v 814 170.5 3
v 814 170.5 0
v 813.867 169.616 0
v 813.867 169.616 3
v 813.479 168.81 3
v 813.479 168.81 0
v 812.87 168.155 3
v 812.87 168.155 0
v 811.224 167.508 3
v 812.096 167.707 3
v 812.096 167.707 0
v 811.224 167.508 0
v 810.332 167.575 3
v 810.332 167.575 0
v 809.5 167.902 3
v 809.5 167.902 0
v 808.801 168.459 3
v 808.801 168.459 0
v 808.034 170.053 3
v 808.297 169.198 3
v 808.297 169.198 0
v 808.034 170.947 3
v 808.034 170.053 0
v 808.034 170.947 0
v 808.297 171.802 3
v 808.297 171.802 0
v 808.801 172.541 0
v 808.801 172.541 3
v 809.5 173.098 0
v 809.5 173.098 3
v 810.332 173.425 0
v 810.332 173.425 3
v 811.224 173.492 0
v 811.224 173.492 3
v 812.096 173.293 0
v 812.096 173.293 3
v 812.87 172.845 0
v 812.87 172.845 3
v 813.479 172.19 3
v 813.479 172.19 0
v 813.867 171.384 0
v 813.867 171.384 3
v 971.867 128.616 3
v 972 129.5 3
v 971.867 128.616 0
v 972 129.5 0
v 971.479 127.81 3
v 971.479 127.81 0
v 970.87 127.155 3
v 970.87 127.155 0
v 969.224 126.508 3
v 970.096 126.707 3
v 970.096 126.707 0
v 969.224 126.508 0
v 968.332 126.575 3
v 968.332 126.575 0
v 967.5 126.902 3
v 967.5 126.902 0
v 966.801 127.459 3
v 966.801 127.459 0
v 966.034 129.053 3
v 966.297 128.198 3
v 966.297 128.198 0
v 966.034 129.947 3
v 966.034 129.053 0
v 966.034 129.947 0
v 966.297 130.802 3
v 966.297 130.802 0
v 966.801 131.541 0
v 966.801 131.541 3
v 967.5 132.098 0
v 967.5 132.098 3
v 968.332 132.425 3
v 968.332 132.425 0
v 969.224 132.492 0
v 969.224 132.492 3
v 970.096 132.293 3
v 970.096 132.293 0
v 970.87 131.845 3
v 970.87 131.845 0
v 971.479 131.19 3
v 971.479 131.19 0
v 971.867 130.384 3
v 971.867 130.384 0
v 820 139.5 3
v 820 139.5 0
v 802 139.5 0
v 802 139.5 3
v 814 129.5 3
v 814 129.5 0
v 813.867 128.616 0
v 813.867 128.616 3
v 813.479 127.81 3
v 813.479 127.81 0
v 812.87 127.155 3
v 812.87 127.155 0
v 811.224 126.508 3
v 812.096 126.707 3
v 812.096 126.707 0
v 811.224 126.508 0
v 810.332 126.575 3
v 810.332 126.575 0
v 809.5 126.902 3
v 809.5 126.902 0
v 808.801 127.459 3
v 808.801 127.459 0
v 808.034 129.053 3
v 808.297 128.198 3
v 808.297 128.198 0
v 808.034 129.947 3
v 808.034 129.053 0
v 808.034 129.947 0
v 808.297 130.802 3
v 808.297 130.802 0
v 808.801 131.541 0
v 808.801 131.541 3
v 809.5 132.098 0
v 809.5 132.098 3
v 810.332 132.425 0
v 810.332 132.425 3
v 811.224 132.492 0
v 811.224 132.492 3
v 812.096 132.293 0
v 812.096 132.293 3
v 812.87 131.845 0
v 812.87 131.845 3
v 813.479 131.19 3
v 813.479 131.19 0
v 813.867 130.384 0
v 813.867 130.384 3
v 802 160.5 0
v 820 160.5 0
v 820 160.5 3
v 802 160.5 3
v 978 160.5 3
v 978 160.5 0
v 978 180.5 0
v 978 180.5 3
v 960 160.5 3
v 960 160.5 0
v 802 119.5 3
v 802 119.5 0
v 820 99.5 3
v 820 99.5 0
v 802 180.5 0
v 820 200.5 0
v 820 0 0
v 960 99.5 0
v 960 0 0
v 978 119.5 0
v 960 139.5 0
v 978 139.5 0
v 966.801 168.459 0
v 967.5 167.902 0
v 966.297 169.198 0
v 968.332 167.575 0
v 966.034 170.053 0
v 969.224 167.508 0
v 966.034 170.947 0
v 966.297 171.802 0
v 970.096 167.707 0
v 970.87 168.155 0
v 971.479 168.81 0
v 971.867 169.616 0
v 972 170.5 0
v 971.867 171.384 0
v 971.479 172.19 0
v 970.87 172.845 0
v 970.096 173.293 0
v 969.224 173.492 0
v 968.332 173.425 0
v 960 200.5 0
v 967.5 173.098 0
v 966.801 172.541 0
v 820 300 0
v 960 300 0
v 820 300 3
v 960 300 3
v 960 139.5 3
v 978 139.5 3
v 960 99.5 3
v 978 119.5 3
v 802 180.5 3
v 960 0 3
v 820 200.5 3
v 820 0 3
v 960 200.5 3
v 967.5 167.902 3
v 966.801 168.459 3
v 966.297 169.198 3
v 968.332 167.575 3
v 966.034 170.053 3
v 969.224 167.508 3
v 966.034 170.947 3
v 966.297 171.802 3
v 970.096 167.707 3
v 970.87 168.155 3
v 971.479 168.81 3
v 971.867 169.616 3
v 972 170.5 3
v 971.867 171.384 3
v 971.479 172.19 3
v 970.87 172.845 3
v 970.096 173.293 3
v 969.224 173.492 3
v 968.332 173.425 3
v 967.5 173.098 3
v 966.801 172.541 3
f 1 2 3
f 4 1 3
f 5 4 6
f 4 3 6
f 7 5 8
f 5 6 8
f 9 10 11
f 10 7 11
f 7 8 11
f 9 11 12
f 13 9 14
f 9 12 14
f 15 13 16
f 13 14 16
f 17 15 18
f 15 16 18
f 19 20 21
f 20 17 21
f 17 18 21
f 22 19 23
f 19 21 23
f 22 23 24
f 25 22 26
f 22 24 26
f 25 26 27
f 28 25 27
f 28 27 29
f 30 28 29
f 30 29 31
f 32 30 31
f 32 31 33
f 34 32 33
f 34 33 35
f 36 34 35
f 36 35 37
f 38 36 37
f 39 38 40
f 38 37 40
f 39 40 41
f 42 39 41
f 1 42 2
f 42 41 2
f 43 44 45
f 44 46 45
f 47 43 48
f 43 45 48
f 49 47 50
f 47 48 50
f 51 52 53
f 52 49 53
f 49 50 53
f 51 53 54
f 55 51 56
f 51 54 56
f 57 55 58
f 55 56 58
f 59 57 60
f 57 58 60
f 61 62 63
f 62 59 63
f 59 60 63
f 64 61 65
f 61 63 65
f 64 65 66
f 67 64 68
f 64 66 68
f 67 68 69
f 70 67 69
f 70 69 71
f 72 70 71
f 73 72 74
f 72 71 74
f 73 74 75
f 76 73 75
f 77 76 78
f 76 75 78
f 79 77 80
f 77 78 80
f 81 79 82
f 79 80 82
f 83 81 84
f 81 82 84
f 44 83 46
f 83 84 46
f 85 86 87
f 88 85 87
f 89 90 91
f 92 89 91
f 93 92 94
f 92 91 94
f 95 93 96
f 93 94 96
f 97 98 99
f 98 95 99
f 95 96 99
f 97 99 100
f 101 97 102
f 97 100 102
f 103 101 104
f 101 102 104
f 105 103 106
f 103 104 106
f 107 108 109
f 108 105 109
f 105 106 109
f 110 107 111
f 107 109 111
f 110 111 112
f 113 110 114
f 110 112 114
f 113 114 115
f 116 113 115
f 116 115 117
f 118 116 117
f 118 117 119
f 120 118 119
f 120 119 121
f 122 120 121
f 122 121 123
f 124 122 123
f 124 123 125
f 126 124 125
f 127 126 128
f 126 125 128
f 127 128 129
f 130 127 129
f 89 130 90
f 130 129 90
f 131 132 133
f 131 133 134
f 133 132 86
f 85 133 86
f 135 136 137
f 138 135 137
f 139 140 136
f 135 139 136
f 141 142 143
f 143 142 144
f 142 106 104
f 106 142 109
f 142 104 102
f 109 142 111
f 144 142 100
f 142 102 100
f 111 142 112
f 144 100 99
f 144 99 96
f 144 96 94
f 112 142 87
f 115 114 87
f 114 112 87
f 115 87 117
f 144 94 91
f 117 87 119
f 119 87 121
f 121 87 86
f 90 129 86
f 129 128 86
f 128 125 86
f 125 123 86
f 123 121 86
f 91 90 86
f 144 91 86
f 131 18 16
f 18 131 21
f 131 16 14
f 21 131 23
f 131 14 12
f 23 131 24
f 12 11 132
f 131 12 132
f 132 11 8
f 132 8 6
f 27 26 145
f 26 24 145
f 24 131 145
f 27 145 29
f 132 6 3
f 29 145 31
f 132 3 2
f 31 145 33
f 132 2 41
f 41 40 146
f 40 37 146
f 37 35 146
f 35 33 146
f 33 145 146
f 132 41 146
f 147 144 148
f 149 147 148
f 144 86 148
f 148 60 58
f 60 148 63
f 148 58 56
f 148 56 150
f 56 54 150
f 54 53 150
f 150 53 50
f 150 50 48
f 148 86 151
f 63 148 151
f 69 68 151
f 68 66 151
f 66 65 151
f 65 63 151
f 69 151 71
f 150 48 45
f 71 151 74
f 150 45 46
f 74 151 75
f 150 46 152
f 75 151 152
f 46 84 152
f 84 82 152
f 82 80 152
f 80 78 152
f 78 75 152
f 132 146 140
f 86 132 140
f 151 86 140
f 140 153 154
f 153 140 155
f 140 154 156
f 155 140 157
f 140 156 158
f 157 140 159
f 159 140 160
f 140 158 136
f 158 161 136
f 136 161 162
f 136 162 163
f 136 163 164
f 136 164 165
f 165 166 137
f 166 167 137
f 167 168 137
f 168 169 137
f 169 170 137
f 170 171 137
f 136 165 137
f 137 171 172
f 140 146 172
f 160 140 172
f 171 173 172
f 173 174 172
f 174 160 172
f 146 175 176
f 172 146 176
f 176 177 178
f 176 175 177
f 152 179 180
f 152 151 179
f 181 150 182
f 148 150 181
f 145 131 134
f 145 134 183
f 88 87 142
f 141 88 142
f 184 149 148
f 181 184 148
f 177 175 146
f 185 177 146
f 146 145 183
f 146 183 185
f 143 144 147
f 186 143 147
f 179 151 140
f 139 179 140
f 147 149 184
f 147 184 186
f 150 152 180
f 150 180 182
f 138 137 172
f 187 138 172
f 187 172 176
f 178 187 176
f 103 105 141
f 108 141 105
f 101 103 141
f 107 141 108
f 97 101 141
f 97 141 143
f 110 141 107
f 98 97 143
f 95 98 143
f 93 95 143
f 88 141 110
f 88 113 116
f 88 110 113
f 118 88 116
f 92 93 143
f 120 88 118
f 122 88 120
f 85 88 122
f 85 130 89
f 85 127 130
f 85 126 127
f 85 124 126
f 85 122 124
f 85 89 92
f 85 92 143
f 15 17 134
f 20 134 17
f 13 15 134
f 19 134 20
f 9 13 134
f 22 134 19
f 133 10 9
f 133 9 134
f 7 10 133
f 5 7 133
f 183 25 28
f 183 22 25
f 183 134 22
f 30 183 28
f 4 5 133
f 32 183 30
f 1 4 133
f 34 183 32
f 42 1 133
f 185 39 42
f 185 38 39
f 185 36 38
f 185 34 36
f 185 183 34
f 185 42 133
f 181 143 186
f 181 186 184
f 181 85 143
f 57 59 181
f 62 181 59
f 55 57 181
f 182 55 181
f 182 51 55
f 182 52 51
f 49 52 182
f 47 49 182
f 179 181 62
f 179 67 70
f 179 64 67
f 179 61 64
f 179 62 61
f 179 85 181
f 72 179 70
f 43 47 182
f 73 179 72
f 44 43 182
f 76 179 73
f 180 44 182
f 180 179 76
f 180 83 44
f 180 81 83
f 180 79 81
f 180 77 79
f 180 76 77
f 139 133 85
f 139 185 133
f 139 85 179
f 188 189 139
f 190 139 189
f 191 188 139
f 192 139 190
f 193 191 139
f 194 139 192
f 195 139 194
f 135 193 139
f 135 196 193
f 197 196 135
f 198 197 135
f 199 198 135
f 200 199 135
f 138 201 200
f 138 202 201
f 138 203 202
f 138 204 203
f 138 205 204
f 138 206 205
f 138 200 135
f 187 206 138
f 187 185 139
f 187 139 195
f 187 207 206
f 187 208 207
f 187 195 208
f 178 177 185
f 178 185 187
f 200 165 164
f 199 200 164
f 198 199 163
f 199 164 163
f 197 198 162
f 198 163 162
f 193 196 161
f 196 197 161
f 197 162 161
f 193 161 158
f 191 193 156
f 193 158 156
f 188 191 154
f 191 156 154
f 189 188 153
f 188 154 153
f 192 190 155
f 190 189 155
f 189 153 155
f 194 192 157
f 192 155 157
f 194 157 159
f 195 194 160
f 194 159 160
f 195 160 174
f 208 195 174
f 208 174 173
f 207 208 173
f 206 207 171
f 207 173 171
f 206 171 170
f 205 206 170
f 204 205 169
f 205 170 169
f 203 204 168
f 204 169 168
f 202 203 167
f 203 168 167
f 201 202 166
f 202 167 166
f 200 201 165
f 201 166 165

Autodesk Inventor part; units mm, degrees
ref_plane "YZ Plane" through (0, 0, 0) normal (1, 0, 0) x (0, 1, 0)
ref_plane "XZ Plane" through (0, 0, 0) normal (0, 1, 0) x (-1, 0, 0)
ref_plane "XY Plane" through (0, 0, 0) normal (0, 0, 1) x (1, 0, 0)
sketch "Sketch1" plane through (0, 0, 0) normal (0, 0, 1) x (1, 0, 0)
  line L0 (0, 0) -> (140, 0)
  line L1 (140, 0) -> (140, 300)
  line L2 (140, 300) -> (0, 300)
  line L3 (0, 300) -> (0, 0)
  line L4 (10, 290) -> (130, 290)
  line L5 (130, 290) -> (130, 10) construction
  line L6 (130, 10) -> (10, 10) construction
  line L7 (10, 10) -> (10, 290) construction
  line L8 (55.013, 210.0189) -> (44.1329, 210.0189) construction
  line L9 (10, 290) -> (130, 290) construction
  line L10 (70, 311.1686) -> (70, 319.6965) construction
  line L11 (64.8975, 210.0189) -> (64.8975, 204.1374) construction
  line L12 (75.1025, 210.0189) -> (75.1025, 204.1374) construction
  spline S0 degree 4 poles (64.8975, 210.0189) (64.8975, 218.5538) (47.6053, 225.9043) (40.8111, 229.8746) (18.3339, 245.7556) (11.7937, 258.2232) (10, 279.3922) (10, 290) knots 0 0 0 0 0 0.284812 0.471394 0.66948 1 1 1 1 1
  line L13 (10, 290) -> (10, 266.9306) construction
  spline S1 degree 4 poles (75.1025, 210.0189) (75.1025, 218.5538) (92.3947, 225.9043) (99.1889, 229.8746) (121.6661, 245.7556) (128.2063, 258.2232) (130, 279.3922) (130, 290) knots 0 0 0 0 0 0.284812 0.471394 0.66948 1 1 1 1 1
  spline S2 degree 4 poles (64.8975, 210.0189) (64.8975, 201.4839) (47.6053, 194.1334) (40.8111, 190.1632) (18.3339, 174.2821) (11.7937, 161.8145) (10, 140.6455) (10, 130.0377) knots 0 0 0 0 0 0.284812 0.471394 0.66948 1 1 1 1 1
  spline S3 degree 4 poles (75.1025, 210.0189) (75.1025, 201.4839) (92.3947, 194.1334) (99.1889, 190.1632) (121.6661, 174.2821) (128.2063, 161.8145) (130, 140.6455) (130, 130.0377) knots 0 0 0 0 0 0.284812 0.471394 0.66948 1 1 1 1 1
  line L14 (10, 130.0377) -> (10, 10)
  line L15 (130, 130.0377) -> (130, 10)
  line L16 (10, 10) -> (130, 10)
  line L17 (240, 186.8124) -> (240, 163.5372) construction
  line L18 (480, 0) -> (340, 0) construction
  line L19 (340, 0) -> (340, 300) construction
  line L20 (340, 300) -> (480, 300) construction
  line L21 (480, 300) -> (480, 0) construction
  line L22 (470, 290) -> (350, 290) construction
  line L23 (350, 290) -> (350, 10) construction
  line L24 (350, 10) -> (470, 10) construction
  line L25 (470, 10) -> (470, 290) construction
  line L26 (424.987, 210.0189) -> (435.8671, 210.0189) construction
  line L27 (470, 290) -> (350, 290) construction
  line L28 (410, 311.1686) -> (410, 319.6965) construction
  line L29 (415.1025, 210.0189) -> (415.1025, 204.1374) construction
  line L30 (404.8975, 210.0189) -> (404.8975, 204.1374) construction
  spline S4 degree 4 poles (415.1025, 210.0189) (415.1025, 218.5538) (432.3947, 225.9043) (439.1889, 229.8746) (461.6661, 245.7556) (468.2063, 258.2232) (470, 279.3922) (470, 290) knots 0 0 0 0 0 0.284812 0.471394 0.66948 1 1 1 1 1 construction
  line L31 (470, 290) -> (470, 266.9306) construction
  spline S5 degree 4 poles (404.8975, 210.0189) (394.814, 224.8509) (381.6315, 227.4313) (352.9317, 245.1456) (350.4567, 267.2032) (350, 290) knots 0 0 0 0 0 0.471394 1 1 1 1 1 construction
  spline S6 degree 4 poles (415.1025, 210.0189) (425.186, 195.1868) (438.3685, 192.6065) (467.0683, 174.8921) (469.5433, 152.8345) (470, 130.0377) knots 0 0 0 0 0 0.471394 1 1 1 1 1 construction
  spline S7 degree 4 poles (404.8975, 210.0189) (394.814, 195.1868) (381.6315, 192.6065) (352.9317, 174.8921) (350.4567, 152.8345) (350, 130.0377) knots 0 0 0 0 0 0.471394 1 1 1 1 1 construction
  line L32 (355, 14.5) -> (355, 130.0377)
  line L33 (355, 130.0377) -> (357, 130.0377)
  line L34 (357, 130.0377) -> (357, 14.5)
  arc A0 (353.5, 13) -> (355, 14.5) centre (353.5, 14.5) ccw
  arc A1 (351, 14.5) -> (352.5, 13) centre (352.5, 14.5) ccw construction
  line L35 (352.5, 13) -> (353.5, 13)
  arc A2 (357, 14.5) -> (358.5, 13) centre (358.5, 14.5) ccw
  line L36 (358.5, 13) -> (359.5, 13)
  line L37 (361, 14.5) -> (361, 130.0377)
  line L38 (363, 130.0377) -> (363, 14.5)
  arc A3 (359.5, 13) -> (361, 14.5) centre (359.5, 14.5) ccw
  line L39 (361, 130.0377) -> (363, 130.0377)
  arc A4 (363, 14.5) -> (364.5, 13) centre (364.5, 14.5) ccw
  line L40 (364.5, 13) -> (365.5, 13)
  line L41 (367, 14.5) -> (367, 130.0377)
  line L42 (369, 130.0377) -> (369, 14.5)
  arc A5 (365.5, 13) -> (367, 14.5) centre (365.5, 14.5) ccw
  line L43 (367, 130.0377) -> (369, 130.0377)
  arc A6 (369, 14.5) -> (370.5, 13) centre (370.5, 14.5) ccw
  line L44 (370.5, 13) -> (371.5, 13)
  line L45 (373, 14.5) -> (373, 130.0377)
  line L46 (375, 130.0377) -> (375, 14.5)
  arc A7 (371.5, 13) -> (373, 14.5) centre (371.5, 14.5) ccw
  line L47 (373, 130.0377) -> (375, 130.0377)
  arc A8 (375, 14.5) -> (376.5, 13) centre (376.5, 14.5) ccw
  line L48 (376.5, 13) -> (377.5, 13)
  line L49 (379, 14.5) -> (379, 130.0377)
  line L50 (381, 130.0377) -> (381, 14.5)
  arc A9 (377.5, 13) -> (379, 14.5) centre (377.5, 14.5) ccw
  line L51 (379, 130.0377) -> (381, 130.0377)
  arc A10 (381, 14.5) -> (382.5, 13) centre (382.5, 14.5) ccw
  line L52 (382.5, 13) -> (383.5, 13)
  line L53 (385, 14.5) -> (385, 130.0377)
  line L54 (387, 130.0377) -> (387, 14.5)
  arc A11 (383.5, 13) -> (385, 14.5) centre (383.5, 14.5) ccw
  line L55 (385, 130.0377) -> (387, 130.0377)
  arc A12 (387, 14.5) -> (388.5, 13) centre (388.5, 14.5) ccw
  line L56 (388.5, 13) -> (389.5, 13)
  line L57 (391, 14.5) -> (391, 130.0377)
  line L58 (393, 130.0377) -> (393, 14.5)
  arc A13 (389.5, 13) -> (391, 14.5) centre (389.5, 14.5) ccw
  line L59 (391, 130.0377) -> (393, 130.0377)
  arc A14 (393, 14.5) -> (394.5, 13) centre (394.5, 14.5) ccw
  line L60 (394.5, 13) -> (395.5, 13)
  line L61 (397, 14.5) -> (397, 130.0377)
  line L62 (399, 130.0377) -> (399, 14.5)
  arc A15 (395.5, 13) -> (397, 14.5) centre (395.5, 14.5) ccw
  line L63 (397, 130.0377) -> (399, 130.0377)
  arc A16 (399, 14.5) -> (400.5, 13) centre (400.5, 14.5) ccw
  line L64 (400.5, 13) -> (401.5, 13)
  line L65 (403, 14.5) -> (403, 130.0377)
  line L66 (405, 130.0377) -> (405, 14.5)
  arc A17 (401.5, 13) -> (403, 14.5) centre (401.5, 14.5) ccw
  line L67 (403, 130.0377) -> (405, 130.0377)
  arc A18 (405, 14.5) -> (406.5, 13) centre (406.5, 14.5) ccw
  line L68 (406.5, 13) -> (407.5, 13)
  line L69 (409, 14.5) -> (409, 130.0377)
  line L70 (411, 130.0377) -> (411, 14.5)
  arc A19 (407.5, 13) -> (409, 14.5) centre (407.5, 14.5) ccw
  line L71 (409, 130.0377) -> (411, 130.0377)
  arc A20 (411, 14.5) -> (412.5, 13) centre (412.5, 14.5) ccw
  line L72 (412.5, 13) -> (413.5, 13)
  line L73 (415, 14.5) -> (415, 130.0377)
  line L74 (417, 130.0377) -> (417, 14.5)
  arc A21 (413.5, 13) -> (415, 14.5) centre (413.5, 14.5) ccw
  line L75 (415, 130.0377) -> (417, 130.0377)
  arc A22 (417, 14.5) -> (418.5, 13) centre (418.5, 14.5) ccw
  line L76 (418.5, 13) -> (419.5, 13)
  line L77 (421, 14.5) -> (421, 130.0377)
  line L78 (423, 130.0377) -> (423, 14.5)
  arc A23 (419.5, 13) -> (421, 14.5) centre (419.5, 14.5) ccw
  line L79 (421, 130.0377) -> (423, 130.0377)
  arc A24 (423, 14.5) -> (424.5, 13) centre (424.5, 14.5) ccw
  line L80 (424.5, 13) -> (425.5, 13)
  line L81 (427, 14.5) -> (427, 130.0377)
  line L82 (429, 130.0377) -> (429, 14.5)
  arc A25 (425.5, 13) -> (427, 14.5) centre (425.5, 14.5) ccw
  line L83 (427, 130.0377) -> (429, 130.0377)
  arc A26 (429, 14.5) -> (430.5, 13) centre (430.5, 14.5) ccw
  line L84 (430.5, 13) -> (431.5, 13)
  line L85 (433, 14.5) -> (433, 130.0377)
  line L86 (435, 130.0377) -> (435, 14.5)
  arc A27 (431.5, 13) -> (433, 14.5) centre (431.5, 14.5) ccw
  line L87 (433, 130.0377) -> (435, 130.0377)
  arc A28 (435, 14.5) -> (436.5, 13) centre (436.5, 14.5) ccw
  line L88 (436.5, 13) -> (437.5, 13)
  line L89 (439, 14.5) -> (439, 130.0377)
  line L90 (441, 130.0377) -> (441, 14.5)
  arc A29 (437.5, 13) -> (439, 14.5) centre (437.5, 14.5) ccw
  line L91 (439, 130.0377) -> (441, 130.0377)
  arc A30 (441, 14.5) -> (442.5, 13) centre (442.5, 14.5) ccw
  line L92 (442.5, 13) -> (443.5, 13)
  line L93 (445, 14.5) -> (445, 130.0377)
  line L94 (447, 130.0377) -> (447, 14.5)
  arc A31 (443.5, 13) -> (445, 14.5) centre (443.5, 14.5) ccw
  line L95 (445, 130.0377) -> (447, 130.0377)
  arc A32 (447, 14.5) -> (448.5, 13) centre (448.5, 14.5) ccw
  line L96 (448.5, 13) -> (449.5, 13)
  line L97 (451, 14.5) -> (451, 130.0377)
  line L98 (453, 130.0377) -> (453, 14.5)
  arc A33 (449.5, 13) -> (451, 14.5) centre (449.5, 14.5) ccw
  line L99 (451, 130.0377) -> (453, 130.0377)
  arc A34 (453, 14.5) -> (454.5, 13) centre (454.5, 14.5) ccw
  line L100 (454.5, 13) -> (455.5, 13)
  line L101 (457, 14.5) -> (457, 130.0377)
  line L102 (459, 130.0377) -> (459, 14.5)
  arc A35 (455.5, 13) -> (457, 14.5) centre (455.5, 14.5) ccw
  line L103 (457, 130.0377) -> (459, 130.0377)
  arc A36 (459, 14.5) -> (460.5, 13) centre (460.5, 14.5) ccw
  line L104 (460.5, 13) -> (461.5, 13)
  line L105 (463, 14.5) -> (463, 130.0377)
  line L106 (465, 130.0377) -> (465, 14.5)
  arc A37 (461.5, 13) -> (463, 14.5) centre (461.5, 14.5) ccw
  line L107 (463, 130.0377) -> (465, 130.0377)
  arc A38 (465, 14.5) -> (466.5, 13) centre (466.5, 14.5) ccw
  line L108 (466.5, 13) -> (470, 13)
  line L109 (470, 10) -> (470, 13)
  line L110 (470, 10) -> (350, 10)
  line L111 (350, 10) -> (350, 13)
  line L112 (352.5, 13) -> (350, 13)
  line L113 (740, 300) -> (600, 300)
  line L114 (610, 290) -> (730, 290) construction
  line L115 (610, 290) -> (730, 290) construction
  spline S8 degree 4 poles (675.1025, 210.0189) (675.1025, 218.5538) (692.3947, 225.9043) (699.1889, 229.8746) (721.6661, 245.7556) (728.2063, 258.2232) (730, 279.3922) (730, 290) knots 0 0 0 0 0 0.284812 0.471394 0.66948 1 1 1 1 1 construction
  line L116 (664.8975, 210.0189) -> (664.8975, 204.1374) construction
  line L117 (610, 290) -> (610, 266.9306) construction
  spline S9 degree 4 poles (664.8975, 210.0189) (664.8975, 218.5538) (647.6053, 225.9043) (640.8111, 229.8746) (618.3339, 245.7556) (611.7937, 258.2232) (610, 279.3922) (610, 290) knots 0 0 0 0 0 0.284812 0.471394 0.66948 1 1 1 1 1 construction
  line L118 (675.1025, 210.0189) -> (675.1025, 204.1374) construction
  spline S10 degree 4 poles (675.1025, 210.0189) (675.1025, 201.4839) (692.3947, 194.1334) (699.1889, 190.1632) (721.6661, 174.2821) (728.2063, 161.8145) (730, 140.6455) (730, 130.0377) knots 0 0 0 0 0 0.284812 0.471394 0.66948 1 1 1 1 1 construction
  spline S11 degree 4 poles (664.8975, 210.0189) (664.8975, 201.4839) (647.6053, 194.1334) (640.8111, 190.1632) (618.3339, 174.2821) (611.7937, 161.8145) (610, 140.6455) (610, 130.0377) knots 0 0 0 0 0 0.284812 0.471394 0.66948 1 1 1 1 1 construction
  line L119 (730, 290) -> (730, 10) construction
  line L120 (610, 10) -> (610, 290) construction
  line L121 (740, 0) -> (740, 300)
  line L122 (600, 300) -> (600, 0)
  line L123 (610, 130.0377) -> (610, 10) construction
  line L124 (730, 10) -> (610, 10) construction
  line L125 (610, 10) -> (730, 10) construction
  line L126 (730, 130.0377) -> (730, 10) construction
  line L127 (600, 0) -> (740, 0)
  circle A39 centre (670, 187.6403) radius 1.45
  line L128 (661.5147, 179.155) -> (670, 187.6403) construction
  line L129 (670, 187.6403) -> (661.5147, 179.155) construction
  line L130 (661.5147, 179.155) -> (678.4853, 179.155) construction
  line L131 (130, 290) -> (130, 293.3347) construction
  line L132 (730, 290) -> (730, 294.5645) construction
  line L133 (670, 187.6403) -> (667.2579, 190.3824) construction
  line L134 (661.5147, 179.155) -> (658.7726, 181.8971) construction
  circle A40 centre (661.5147, 179.155) radius 1.45
  circle A41 centre (653.0294, 170.6697) radius 1.45
  circle A42 centre (644.5442, 162.1844) radius 1.45
  circle A43 centre (636.0589, 153.6991) radius 1.45
  circle A44 centre (627.5736, 145.2139) radius 1.45
  circle A45 centre (619.0883, 136.7286) radius 1.45
  circle A46 centre (619.0883, 153.6991) radius 1.45
  circle A47 centre (627.5736, 162.1844) radius 1.45
  circle A48 centre (636.0589, 170.6697) radius 1.45
  circle A49 centre (644.5442, 179.155) radius 1.45
  circle A50 centre (653.0294, 187.6403) radius 1.45
  circle A51 centre (686.9706, 187.6403) radius 1.45
  circle A52 centre (678.4853, 179.155) radius 1.45
  circle A53 centre (670, 170.6697) radius 1.45
  circle A54 centre (661.5147, 162.1844) radius 1.45
  circle A55 centre (653.0294, 153.6991) radius 1.45
  circle A56 centre (644.5442, 145.2139) radius 1.45
  circle A57 centre (636.0589, 136.7286) radius 1.45
  circle A58 centre (695.4558, 179.155) radius 1.45
  circle A59 centre (686.9706, 170.6697) radius 1.45
  circle A60 centre (670, 170.6697) radius 1.45
  circle A61 centre (661.5147, 162.1844) radius 1.45
  circle A62 centre (678.4853, 162.1844) radius 1.45
  circle A63 centre (653.0294, 153.6991) radius 1.45
  circle A64 centre (670, 153.6991) radius 1.45
  circle A65 centre (661.5147, 145.2139) radius 1.45
  circle A66 centre (644.5442, 145.2139) radius 1.45
  circle A67 centre (636.0589, 136.7286) radius 1.45
  circle A68 centre (653.0294, 136.7286) radius 1.45
  circle A69 centre (695.4558, 162.1844) radius 1.45
  circle A70 centre (686.9706, 153.6991) radius 1.45
  circle A71 centre (678.4853, 145.2139) radius 1.45
  circle A72 centre (670, 136.7286) radius 1.45
  circle A73 centre (712.4264, 162.1844) radius 1.45
  circle A74 centre (703.9411, 153.6991) radius 1.45
  circle A75 centre (695.4558, 145.2139) radius 1.45
  circle A76 centre (686.9706, 136.7286) radius 1.45
  circle A77 centre (703.9411, 170.6697) radius 1.45
  circle A78 centre (720.9117, 153.6991) radius 1.45
  circle A79 centre (712.4264, 145.2139) radius 1.45
  circle A80 centre (703.9411, 136.7286) radius 1.45
  circle A81 centre (720.9117, 136.7286) radius 1.45
  line L135 (0, 160.5) -> (-18, 160.5)
  line L136 (-18, 160.5) -> (-18, 180.5)
  line L137 (-18, 180.5) -> (0, 180.5) construction
  line L138 (0, 180.5) -> (0, 160.5)
  line L139 (-24.3067, 150) -> (-34.4998, 150) construction
  circle A82 centre (-9, 170.5) radius 3
  line L140 (-18, 180.5) -> (0, 200.5)
  line L141 (0, 139.5) -> (-18, 139.5)
  line L142 (-18, 139.5) -> (-18, 119.5)
  circle A83 centre (-9, 129.5) radius 3
  line L143 (-18, 119.5) -> (0, 99.5)
  line L144 (140, 160.5) -> (158, 160.5)
  line L145 (158, 160.5) -> (158, 180.5)
  circle A84 centre (149, 170.5) radius 3
  line L146 (158, 180.5) -> (140, 200.5)
  line L147 (158, 139.5) -> (158, 119.5)
  line L148 (140, 139.5) -> (158, 139.5)
  circle A85 centre (149, 129.5) radius 3
  line L149 (158, 119.5) -> (140, 99.5)
  line L150 (582, 180.5) -> (600, 200.5)
  line L151 (582, 160.5) -> (582, 180.5)
  circle A86 centre (591, 170.5) radius 3
  line L152 (600, 139.5) -> (582, 139.5)
  circle A87 centre (591, 129.5) radius 3
  line L153 (582, 139.5) -> (582, 119.5)
  line L154 (582, 119.5) -> (600, 99.5)
  line L155 (758, 180.5) -> (740, 200.5)
  line L156 (758, 160.5) -> (758, 180.5)
  circle A88 centre (749, 170.5) radius 3
  line L157 (740, 160.5) -> (758, 160.5)
  line L158 (740, 139.5) -> (758, 139.5)
  circle A89 centre (749, 129.5) radius 3
  line L159 (758, 139.5) -> (758, 119.5)
  line L160 (758, 119.5) -> (740, 99.5)
  line L161 (600, 160.5) -> (582, 160.5)
  line L162 (600, 200.5) -> (600, 300)
  line L163 (600, 300) -> (740, 300)
  line L164 (740, 300) -> (740, 200.5)
  line L165 (740, 160.5) -> (740, 139.5)
  line L166 (740, 99.5) -> (740, 0)
  line L167 (740, 0) -> (600, 0)
  line L168 (600, 0) -> (600, 99.5)
  line L169 (600, 139.5) -> (600, 160.5)
  line L170 (780, 153.6991) -> (780, 161.6118) construction
  line L171 (820, 300) -> (960, 300)
  line L172 (960, 0) -> (820, 0)
  line L173 (978, 180.5) -> (960, 200.5)
  line L174 (978, 160.5) -> (978, 180.5)
  circle A90 centre (969, 170.5) radius 3
  line L175 (960, 139.5) -> (978, 139.5)
  circle A91 centre (969, 129.5) radius 3
  line L176 (978, 139.5) -> (978, 119.5)
  line L177 (978, 119.5) -> (960, 99.5)
  line L178 (802, 180.5) -> (820, 200.5)
  line L179 (802, 160.5) -> (802, 180.5)
  circle A92 centre (811, 170.5) radius 3
  line L180 (820, 160.5) -> (802, 160.5)
  line L181 (820, 139.5) -> (802, 139.5)
  circle A93 centre (811, 129.5) radius 3
  line L182 (802, 139.5) -> (802, 119.5)
  line L183 (802, 119.5) -> (820, 99.5)
  line L184 (960, 160.5) -> (978, 160.5)
  line L185 (960, 200.5) -> (960, 300)
  line L186 (960, 300) -> (820, 300)
  line L187 (820, 300) -> (820, 200.5)
  line L188 (820, 160.5) -> (820, 139.5)
  line L189 (820, 99.5) -> (820, 0)
  line L190 (820, 0) -> (960, 0)
  line L191 (960, 0) -> (960, 99.5)
  line L192 (960, 139.5) -> (960, 160.5)
  line L193 (582, -180.5) -> (582, -200.5) construction
  circle A94 centre (591, -190.5) radius 3 construction
  line L194 (600, -159.5) -> (582, -159.5) construction
  line L195 (600, -180.5) -> (582, -180.5) construction
  line L196 (582, -200.5) -> (600, -220.5) construction
  line L197 (582, -139.5) -> (600, -119.5) construction
  line L198 (582, -159.5) -> (582, -139.5) construction
  circle A95 centre (591, -149.5) radius 3 construction
  circle A96 centre (619.0883, -166.3009) radius 1.45 construction
  circle A97 centre (627.5736, -174.7861) radius 1.45 construction
  circle A98 centre (644.5442, -157.8156) radius 1.45 construction
  circle A99 centre (627.5736, -157.8156) radius 1.45 construction
  circle A100 centre (644.5442, -174.7861) radius 1.45 construction
  circle A101 centre (636.0589, -183.2714) radius 1.45 construction
  line L199 (600, -180.5) -> (600, -159.5) construction
  circle A102 centre (636.0589, -183.2714) radius 1.45 construction
  circle A103 centre (644.5442, -174.7861) radius 1.45 construction
  circle A104 centre (619.0883, -183.2714) radius 1.45 construction
  circle A105 centre (636.0589, -166.3009) radius 1.45 construction
  circle A106 centre (653.0294, -183.2714) radius 1.45 construction
  circle A107 centre (661.5147, -174.7861) radius 1.45 construction
  line L200 (664.8975, -109.9811) -> (664.8975, -115.8626) construction
  line L201 (610, -30) -> (610, -53.0694) construction
  spline S12 degree 4 poles (664.8975, -109.9811) (664.8975, -118.5161) (647.6053, -125.8666) (640.8111, -129.8368) (618.3339, -145.7179) (611.7937, -158.1855) (610, -179.3545) (610, -189.9623) knots 0 0 0 0 0 0.284812 0.471394 0.66948 1 1 1 1 1 construction
  circle A108 centre (670, -149.3303) radius 1.45 construction
  circle A109 centre (678.4853, -140.845) radius 1.45 construction
  circle A110 centre (686.9706, -166.3009) radius 1.45 construction
  circle A111 centre (670, -166.3009) radius 1.45 construction
  circle A112 centre (653.0294, -166.3009) radius 1.45 construction
  circle A113 centre (653.0294, -166.3009) radius 1.45 construction
  spline S13 degree 4 poles (664.8975, -109.9811) (664.8975, -101.4462) (647.6053, -94.0957) (640.8111, -90.1254) (618.3339, -74.2444) (611.7937, -61.7768) (610, -40.6078) (610, -30) knots 0 0 0 0 0 0.284812 0.471394 0.66948 1 1 1 1 1 construction
  circle A114 centre (670, -132.3597) radius 1.45 construction
  circle A115 centre (636.0589, -149.3303) radius 1.45 construction
  circle A116 centre (653.0294, -149.3303) radius 1.45 construction
  circle A117 centre (644.5442, -140.845) radius 1.45 construction
  circle A118 centre (653.0294, -132.3597) radius 1.45 construction
  line L202 (661.5147, -140.845) -> (658.7726, -138.1029) construction
  line L203 (661.5147, -140.845) -> (670, -132.3597) construction
  line L204 (670, -132.3597) -> (661.5147, -140.845) construction
  line L205 (670, -132.3597) -> (667.2579, -129.6176) construction
  line L206 (661.5147, -140.845) -> (678.4853, -140.845) construction
  circle A119 centre (686.9706, -132.3597) radius 1.45 construction
  line L207 (600, -119.5) -> (600, -20) construction
  line L208 (600, -20) -> (740, -20) construction
  line L209 (730, -30) -> (730, -25.4355) construction
  line L210 (740, -20) -> (740, -119.5) construction
  circle A120 centre (661.5147, -140.845) radius 1.45 construction
  line L211 (610, -189.9623) -> (610, -310) construction
  line L212 (600, -320) -> (600, -220.5) construction
  line L213 (730, -310) -> (610, -310) construction
  line L214 (610, -310) -> (730, -310) construction
  line L215 (600, -320) -> (740, -320) construction
  line L216 (740, -320) -> (600, -320) construction
  line L217 (730, -189.9623) -> (730, -310) construction
  line L218 (740, -220.5) -> (740, -320) construction
  line L219 (740, -20) -> (600, -20) construction
  line L220 (675.1025, -109.9811) -> (675.1025, -115.8626) construction
  line L221 (610, -30) -> (730, -30) construction
  line L222 (610, -30) -> (730, -30) construction
  spline S14 degree 4 poles (675.1025, -109.9811) (675.1025, -101.4462) (692.3947, -94.0957) (699.1889, -90.1254) (721.6661, -74.2444) (728.2063, -61.7768) (730, -40.6078) (730, -30) knots 0 0 0 0 0 0.284812 0.471394 0.66948 1 1 1 1 1 construction
  line L223 (610, -310) -> (610, -30) construction
  line L224 (600, -20) -> (600, -320) construction
  line L225 (740, -320) -> (740, -20) construction
  line L226 (730, -30) -> (730, -310) construction
  circle A121 centre (678.4853, -174.7861) radius 1.45 construction
  circle A122 centre (670, -183.2714) radius 1.45 construction
  spline S15 degree 4 poles (675.1025, -109.9811) (675.1025, -118.5161) (692.3947, -125.8666) (699.1889, -129.8368) (721.6661, -145.7179) (728.2063, -158.1855) (730, -179.3545) (730, -189.9623) knots 0 0 0 0 0 0.284812 0.471394 0.66948 1 1 1 1 1 construction
  circle A123 centre (686.9706, -183.2714) radius 1.45 construction
  circle A124 centre (670, -149.3303) radius 1.45 construction
  circle A125 centre (661.5147, -157.8156) radius 1.45 construction
  circle A126 centre (695.4558, -140.845) radius 1.45 construction
  circle A127 centre (686.9706, -149.3303) radius 1.45 construction
  circle A128 centre (678.4853, -157.8156) radius 1.45 construction
  circle A129 centre (703.9411, -149.3303) radius 1.45 construction
  line L227 (758, -139.5) -> (740, -119.5) construction
  circle A130 centre (749, -149.5) radius 3 construction
  line L228 (758, -159.5) -> (758, -139.5) construction
  circle A131 centre (661.5147, -157.8156) radius 1.45 construction
  circle A132 centre (703.9411, -183.2714) radius 1.45 construction
  circle A133 centre (712.4264, -174.7861) radius 1.45 construction
  circle A134 centre (720.9117, -183.2714) radius 1.45 construction
  circle A135 centre (695.4558, -174.7861) radius 1.45 construction
  line L229 (740, -159.5) -> (740, -180.5) construction
  line L230 (758, -200.5) -> (740, -220.5) construction
  circle A136 centre (749, -190.5) radius 3 construction
  line L231 (758, -180.5) -> (758, -200.5) construction
  line L232 (740, -180.5) -> (758, -180.5) construction
  line L233 (740, -159.5) -> (758, -159.5) construction
  circle A137 centre (720.9117, -166.3009) radius 1.45 construction
  circle A138 centre (703.9411, -166.3009) radius 1.45 construction
  circle A139 centre (695.4558, -157.8156) radius 1.45 construction
  circle A140 centre (712.4264, -157.8156) radius 1.45 construction
  line L234 (600, -122.3597) -> (740, -122.3597)
  line L235 (740, -122.3597) -> (740, -193.2714)
  line L236 (740, -193.2714) -> (600, -193.2714)
  line L237 (600, -193.2714) -> (600, -122.3597)
  point P0 (70, 290)
  point P1 (70, 300)
  point P2 (10, 150)
  point P3 (0, 150)
  point P4 (70, 290)
  point P5 (70, 315.4325)
  point P6 (49.5729, 210.0189)
  point P7 (49.5729, 225.4245)
  point P8 (37.5413, 232.3974)
  point P9 (24.0774, 242.8841)
  point P10 (14.2457, 257.8533)
  point P11 (90.4271, 225.4245)
  point P12 (102.4587, 232.3974)
  point P13 (115.9226, 242.8841)
  point P14 (125.7543, 257.8533)
  point P15 (49.5729, 194.6132)
  point P16 (37.5413, 187.6403)
  point P17 (24.0774, 177.1536)
  point P18 (14.2457, 162.1844)
  point P19 (90.4271, 194.6132)
  point P20 (102.4587, 187.6403)
  point P21 (115.9226, 177.1536)
  point P22 (125.7543, 162.1844)
  point P23 (410, 290)
  point P24 (410, 300)
  point P25 (470, 150)
  point P26 (480, 150)
  point P27 (410, 290)
  point P28 (410, 315.4325)
  point P29 (430.4271, 210.0189)
  point P30 (430.4271, 225.4245)
  point P31 (442.4587, 232.3974)
  point P32 (455.9226, 242.8841)
  point P33 (465.7543, 257.8533)
  point P34 (389.5729, 225.4245)
  point P35 (377.5413, 232.3974)
  point P36 (364.0774, 242.8841)
  point P37 (354.2457, 257.8533)
  point P38 (430.4271, 194.6132)
  point P39 (442.4587, 187.6403)
  point P40 (455.9226, 177.1536)
  point P41 (465.7543, 162.1844)
  point P42 (389.5729, 194.6132)
  point P43 (377.5413, 187.6403)
  point P44 (364.0774, 177.1536)
  point P45 (354.2457, 162.1844)
  point P46 (356, 130.0377)
  point P47 (362, 130.0377)
  point P48 (368, 130.0377)
  point P49 (374, 130.0377)
  point P50 (380, 130.0377)
  point P51 (386, 130.0377)
  point P52 (392, 130.0377)
  point P53 (398, 130.0377)
  point P54 (404, 130.0377)
  point P55 (410, 130.0377)
  point P56 (416, 130.0377)
  point P57 (422, 130.0377)
  point P58 (428, 130.0377)
  point P59 (434, 130.0377)
  point P60 (440, 130.0377)
  point P61 (446, 130.0377)
  point P62 (452, 130.0377)
  point P63 (458, 130.0377)
  point P64 (464, 130.0377)
  point P65 (410, 130.0377)
  point P66 (410, 315.4325)
  point P67 (670, 300)
  point P68 (670, 290)
  point P69 (670, 290)
  point P70 (690.4271, 225.4245)
  point P71 (702.4587, 232.3974)
  point P72 (715.9226, 242.8841)
  point P73 (725.7543, 257.8533)
  point P74 (649.5729, 225.4245)
  point P75 (637.5413, 232.3974)
  point P76 (624.0774, 242.8841)
  point P77 (614.2457, 257.8533)
  point P78 (690.4271, 194.6132)
  point P79 (649.5729, 194.6132)
  point P80 (702.4587, 187.6403)
  point P81 (637.5413, 187.6403)
  point P82 (715.9226, 177.1536)
  point P83 (624.0774, 177.1536)
  point P84 (614.2457, 162.1844)
  point P85 (725.7543, 162.1844)
  point P86 (610, 150)
  point P87 (600, 150)
  point P88 (670, 179.155)
  point P89 (670, 300)
  point P90 (-29.4032, 150)
  point P91 (-18, 170.5)
  point P92 (-9, 180.5)
  point P93 (582, 170.5)
  point P94 (890, 300)
  point P95 (960, 150)
  point P96 (890, 300)
  point P97 (978, 170.5)
  point P98 (582, -149.5)
  point P99 (600, -170)
  point P100 (670, -30)
  point P101 (670, -30)
  point P102 (670, -20)
  point P103 (637.5413, -132.3597)
  point P104 (624.0774, -142.8464)
  point P105 (614.2457, -157.8156)
  point P106 (649.5729, -125.3868)
  point P107 (610, -170)
  point P108 (670, -140.845)
  point P109 (649.5729, -94.5755)
  point P110 (637.5413, -87.6026)
  point P111 (624.0774, -77.1159)
  point P112 (614.2457, -62.1467)
  point P113 (670, -20)
  point P114 (690.4271, -94.5755)
  point P115 (702.4587, -87.6026)
  point P116 (725.7543, -62.1467)
  point P117 (702.4587, -132.3597)
  point P118 (715.9226, -77.1159)
  point P119 (690.4271, -125.3868)
  point P120 (715.9226, -142.8464)
  point P121 (725.7543, -157.8156)
  dimension "d0" = 140
  dimension "d1" = 300
  dimension "d2" = 10
  dimension "d3" = 10
  dimension "d5" = 100
  dimension "d6" = 2
  dimension "d9" = 79.9811
  dimension "d12" = 1.5
  dimension "d13" = 1.5
  dimension "d15" = 4
  dimension "d18" = 6
  dimension "d23" = 3
  dimension "d26" = 600
  dimension "d33" = 2.9
  dimension "d34" = 45
  dimension "d35" = 12
  dimension "d38" = 12
  dimension "d45" = 16.9706
  dimension "d52" = 16.9706
  dimension "d59" = 16.9706
  dimension "d66" = 16.9706
  dimension "d73" = 16.9706
  dimension "d80" = 16.9706
  dimension "d85" = 18
  dimension "d86" = 20
  dimension "d87" = 10.5
  dimension "d88" = 6
  dimension "d89" = 20
  dimension "d92" = 600
  dimension "d97" = 10.2051
  dimension "d98" = 40
  dimension "d101" = 320
  dimension "d106" = 10
  dimension "d107" = 10
extrude "Extrusion1" add sketch "Sketch1" along normal blind 3 contours L171 L185 L173 L174 L184 L192 L175 L176 L177 L191 L172 L189 L183 L182 L181 L188 L180 L179 L178 L187
properties part number "SGB-1-front"
